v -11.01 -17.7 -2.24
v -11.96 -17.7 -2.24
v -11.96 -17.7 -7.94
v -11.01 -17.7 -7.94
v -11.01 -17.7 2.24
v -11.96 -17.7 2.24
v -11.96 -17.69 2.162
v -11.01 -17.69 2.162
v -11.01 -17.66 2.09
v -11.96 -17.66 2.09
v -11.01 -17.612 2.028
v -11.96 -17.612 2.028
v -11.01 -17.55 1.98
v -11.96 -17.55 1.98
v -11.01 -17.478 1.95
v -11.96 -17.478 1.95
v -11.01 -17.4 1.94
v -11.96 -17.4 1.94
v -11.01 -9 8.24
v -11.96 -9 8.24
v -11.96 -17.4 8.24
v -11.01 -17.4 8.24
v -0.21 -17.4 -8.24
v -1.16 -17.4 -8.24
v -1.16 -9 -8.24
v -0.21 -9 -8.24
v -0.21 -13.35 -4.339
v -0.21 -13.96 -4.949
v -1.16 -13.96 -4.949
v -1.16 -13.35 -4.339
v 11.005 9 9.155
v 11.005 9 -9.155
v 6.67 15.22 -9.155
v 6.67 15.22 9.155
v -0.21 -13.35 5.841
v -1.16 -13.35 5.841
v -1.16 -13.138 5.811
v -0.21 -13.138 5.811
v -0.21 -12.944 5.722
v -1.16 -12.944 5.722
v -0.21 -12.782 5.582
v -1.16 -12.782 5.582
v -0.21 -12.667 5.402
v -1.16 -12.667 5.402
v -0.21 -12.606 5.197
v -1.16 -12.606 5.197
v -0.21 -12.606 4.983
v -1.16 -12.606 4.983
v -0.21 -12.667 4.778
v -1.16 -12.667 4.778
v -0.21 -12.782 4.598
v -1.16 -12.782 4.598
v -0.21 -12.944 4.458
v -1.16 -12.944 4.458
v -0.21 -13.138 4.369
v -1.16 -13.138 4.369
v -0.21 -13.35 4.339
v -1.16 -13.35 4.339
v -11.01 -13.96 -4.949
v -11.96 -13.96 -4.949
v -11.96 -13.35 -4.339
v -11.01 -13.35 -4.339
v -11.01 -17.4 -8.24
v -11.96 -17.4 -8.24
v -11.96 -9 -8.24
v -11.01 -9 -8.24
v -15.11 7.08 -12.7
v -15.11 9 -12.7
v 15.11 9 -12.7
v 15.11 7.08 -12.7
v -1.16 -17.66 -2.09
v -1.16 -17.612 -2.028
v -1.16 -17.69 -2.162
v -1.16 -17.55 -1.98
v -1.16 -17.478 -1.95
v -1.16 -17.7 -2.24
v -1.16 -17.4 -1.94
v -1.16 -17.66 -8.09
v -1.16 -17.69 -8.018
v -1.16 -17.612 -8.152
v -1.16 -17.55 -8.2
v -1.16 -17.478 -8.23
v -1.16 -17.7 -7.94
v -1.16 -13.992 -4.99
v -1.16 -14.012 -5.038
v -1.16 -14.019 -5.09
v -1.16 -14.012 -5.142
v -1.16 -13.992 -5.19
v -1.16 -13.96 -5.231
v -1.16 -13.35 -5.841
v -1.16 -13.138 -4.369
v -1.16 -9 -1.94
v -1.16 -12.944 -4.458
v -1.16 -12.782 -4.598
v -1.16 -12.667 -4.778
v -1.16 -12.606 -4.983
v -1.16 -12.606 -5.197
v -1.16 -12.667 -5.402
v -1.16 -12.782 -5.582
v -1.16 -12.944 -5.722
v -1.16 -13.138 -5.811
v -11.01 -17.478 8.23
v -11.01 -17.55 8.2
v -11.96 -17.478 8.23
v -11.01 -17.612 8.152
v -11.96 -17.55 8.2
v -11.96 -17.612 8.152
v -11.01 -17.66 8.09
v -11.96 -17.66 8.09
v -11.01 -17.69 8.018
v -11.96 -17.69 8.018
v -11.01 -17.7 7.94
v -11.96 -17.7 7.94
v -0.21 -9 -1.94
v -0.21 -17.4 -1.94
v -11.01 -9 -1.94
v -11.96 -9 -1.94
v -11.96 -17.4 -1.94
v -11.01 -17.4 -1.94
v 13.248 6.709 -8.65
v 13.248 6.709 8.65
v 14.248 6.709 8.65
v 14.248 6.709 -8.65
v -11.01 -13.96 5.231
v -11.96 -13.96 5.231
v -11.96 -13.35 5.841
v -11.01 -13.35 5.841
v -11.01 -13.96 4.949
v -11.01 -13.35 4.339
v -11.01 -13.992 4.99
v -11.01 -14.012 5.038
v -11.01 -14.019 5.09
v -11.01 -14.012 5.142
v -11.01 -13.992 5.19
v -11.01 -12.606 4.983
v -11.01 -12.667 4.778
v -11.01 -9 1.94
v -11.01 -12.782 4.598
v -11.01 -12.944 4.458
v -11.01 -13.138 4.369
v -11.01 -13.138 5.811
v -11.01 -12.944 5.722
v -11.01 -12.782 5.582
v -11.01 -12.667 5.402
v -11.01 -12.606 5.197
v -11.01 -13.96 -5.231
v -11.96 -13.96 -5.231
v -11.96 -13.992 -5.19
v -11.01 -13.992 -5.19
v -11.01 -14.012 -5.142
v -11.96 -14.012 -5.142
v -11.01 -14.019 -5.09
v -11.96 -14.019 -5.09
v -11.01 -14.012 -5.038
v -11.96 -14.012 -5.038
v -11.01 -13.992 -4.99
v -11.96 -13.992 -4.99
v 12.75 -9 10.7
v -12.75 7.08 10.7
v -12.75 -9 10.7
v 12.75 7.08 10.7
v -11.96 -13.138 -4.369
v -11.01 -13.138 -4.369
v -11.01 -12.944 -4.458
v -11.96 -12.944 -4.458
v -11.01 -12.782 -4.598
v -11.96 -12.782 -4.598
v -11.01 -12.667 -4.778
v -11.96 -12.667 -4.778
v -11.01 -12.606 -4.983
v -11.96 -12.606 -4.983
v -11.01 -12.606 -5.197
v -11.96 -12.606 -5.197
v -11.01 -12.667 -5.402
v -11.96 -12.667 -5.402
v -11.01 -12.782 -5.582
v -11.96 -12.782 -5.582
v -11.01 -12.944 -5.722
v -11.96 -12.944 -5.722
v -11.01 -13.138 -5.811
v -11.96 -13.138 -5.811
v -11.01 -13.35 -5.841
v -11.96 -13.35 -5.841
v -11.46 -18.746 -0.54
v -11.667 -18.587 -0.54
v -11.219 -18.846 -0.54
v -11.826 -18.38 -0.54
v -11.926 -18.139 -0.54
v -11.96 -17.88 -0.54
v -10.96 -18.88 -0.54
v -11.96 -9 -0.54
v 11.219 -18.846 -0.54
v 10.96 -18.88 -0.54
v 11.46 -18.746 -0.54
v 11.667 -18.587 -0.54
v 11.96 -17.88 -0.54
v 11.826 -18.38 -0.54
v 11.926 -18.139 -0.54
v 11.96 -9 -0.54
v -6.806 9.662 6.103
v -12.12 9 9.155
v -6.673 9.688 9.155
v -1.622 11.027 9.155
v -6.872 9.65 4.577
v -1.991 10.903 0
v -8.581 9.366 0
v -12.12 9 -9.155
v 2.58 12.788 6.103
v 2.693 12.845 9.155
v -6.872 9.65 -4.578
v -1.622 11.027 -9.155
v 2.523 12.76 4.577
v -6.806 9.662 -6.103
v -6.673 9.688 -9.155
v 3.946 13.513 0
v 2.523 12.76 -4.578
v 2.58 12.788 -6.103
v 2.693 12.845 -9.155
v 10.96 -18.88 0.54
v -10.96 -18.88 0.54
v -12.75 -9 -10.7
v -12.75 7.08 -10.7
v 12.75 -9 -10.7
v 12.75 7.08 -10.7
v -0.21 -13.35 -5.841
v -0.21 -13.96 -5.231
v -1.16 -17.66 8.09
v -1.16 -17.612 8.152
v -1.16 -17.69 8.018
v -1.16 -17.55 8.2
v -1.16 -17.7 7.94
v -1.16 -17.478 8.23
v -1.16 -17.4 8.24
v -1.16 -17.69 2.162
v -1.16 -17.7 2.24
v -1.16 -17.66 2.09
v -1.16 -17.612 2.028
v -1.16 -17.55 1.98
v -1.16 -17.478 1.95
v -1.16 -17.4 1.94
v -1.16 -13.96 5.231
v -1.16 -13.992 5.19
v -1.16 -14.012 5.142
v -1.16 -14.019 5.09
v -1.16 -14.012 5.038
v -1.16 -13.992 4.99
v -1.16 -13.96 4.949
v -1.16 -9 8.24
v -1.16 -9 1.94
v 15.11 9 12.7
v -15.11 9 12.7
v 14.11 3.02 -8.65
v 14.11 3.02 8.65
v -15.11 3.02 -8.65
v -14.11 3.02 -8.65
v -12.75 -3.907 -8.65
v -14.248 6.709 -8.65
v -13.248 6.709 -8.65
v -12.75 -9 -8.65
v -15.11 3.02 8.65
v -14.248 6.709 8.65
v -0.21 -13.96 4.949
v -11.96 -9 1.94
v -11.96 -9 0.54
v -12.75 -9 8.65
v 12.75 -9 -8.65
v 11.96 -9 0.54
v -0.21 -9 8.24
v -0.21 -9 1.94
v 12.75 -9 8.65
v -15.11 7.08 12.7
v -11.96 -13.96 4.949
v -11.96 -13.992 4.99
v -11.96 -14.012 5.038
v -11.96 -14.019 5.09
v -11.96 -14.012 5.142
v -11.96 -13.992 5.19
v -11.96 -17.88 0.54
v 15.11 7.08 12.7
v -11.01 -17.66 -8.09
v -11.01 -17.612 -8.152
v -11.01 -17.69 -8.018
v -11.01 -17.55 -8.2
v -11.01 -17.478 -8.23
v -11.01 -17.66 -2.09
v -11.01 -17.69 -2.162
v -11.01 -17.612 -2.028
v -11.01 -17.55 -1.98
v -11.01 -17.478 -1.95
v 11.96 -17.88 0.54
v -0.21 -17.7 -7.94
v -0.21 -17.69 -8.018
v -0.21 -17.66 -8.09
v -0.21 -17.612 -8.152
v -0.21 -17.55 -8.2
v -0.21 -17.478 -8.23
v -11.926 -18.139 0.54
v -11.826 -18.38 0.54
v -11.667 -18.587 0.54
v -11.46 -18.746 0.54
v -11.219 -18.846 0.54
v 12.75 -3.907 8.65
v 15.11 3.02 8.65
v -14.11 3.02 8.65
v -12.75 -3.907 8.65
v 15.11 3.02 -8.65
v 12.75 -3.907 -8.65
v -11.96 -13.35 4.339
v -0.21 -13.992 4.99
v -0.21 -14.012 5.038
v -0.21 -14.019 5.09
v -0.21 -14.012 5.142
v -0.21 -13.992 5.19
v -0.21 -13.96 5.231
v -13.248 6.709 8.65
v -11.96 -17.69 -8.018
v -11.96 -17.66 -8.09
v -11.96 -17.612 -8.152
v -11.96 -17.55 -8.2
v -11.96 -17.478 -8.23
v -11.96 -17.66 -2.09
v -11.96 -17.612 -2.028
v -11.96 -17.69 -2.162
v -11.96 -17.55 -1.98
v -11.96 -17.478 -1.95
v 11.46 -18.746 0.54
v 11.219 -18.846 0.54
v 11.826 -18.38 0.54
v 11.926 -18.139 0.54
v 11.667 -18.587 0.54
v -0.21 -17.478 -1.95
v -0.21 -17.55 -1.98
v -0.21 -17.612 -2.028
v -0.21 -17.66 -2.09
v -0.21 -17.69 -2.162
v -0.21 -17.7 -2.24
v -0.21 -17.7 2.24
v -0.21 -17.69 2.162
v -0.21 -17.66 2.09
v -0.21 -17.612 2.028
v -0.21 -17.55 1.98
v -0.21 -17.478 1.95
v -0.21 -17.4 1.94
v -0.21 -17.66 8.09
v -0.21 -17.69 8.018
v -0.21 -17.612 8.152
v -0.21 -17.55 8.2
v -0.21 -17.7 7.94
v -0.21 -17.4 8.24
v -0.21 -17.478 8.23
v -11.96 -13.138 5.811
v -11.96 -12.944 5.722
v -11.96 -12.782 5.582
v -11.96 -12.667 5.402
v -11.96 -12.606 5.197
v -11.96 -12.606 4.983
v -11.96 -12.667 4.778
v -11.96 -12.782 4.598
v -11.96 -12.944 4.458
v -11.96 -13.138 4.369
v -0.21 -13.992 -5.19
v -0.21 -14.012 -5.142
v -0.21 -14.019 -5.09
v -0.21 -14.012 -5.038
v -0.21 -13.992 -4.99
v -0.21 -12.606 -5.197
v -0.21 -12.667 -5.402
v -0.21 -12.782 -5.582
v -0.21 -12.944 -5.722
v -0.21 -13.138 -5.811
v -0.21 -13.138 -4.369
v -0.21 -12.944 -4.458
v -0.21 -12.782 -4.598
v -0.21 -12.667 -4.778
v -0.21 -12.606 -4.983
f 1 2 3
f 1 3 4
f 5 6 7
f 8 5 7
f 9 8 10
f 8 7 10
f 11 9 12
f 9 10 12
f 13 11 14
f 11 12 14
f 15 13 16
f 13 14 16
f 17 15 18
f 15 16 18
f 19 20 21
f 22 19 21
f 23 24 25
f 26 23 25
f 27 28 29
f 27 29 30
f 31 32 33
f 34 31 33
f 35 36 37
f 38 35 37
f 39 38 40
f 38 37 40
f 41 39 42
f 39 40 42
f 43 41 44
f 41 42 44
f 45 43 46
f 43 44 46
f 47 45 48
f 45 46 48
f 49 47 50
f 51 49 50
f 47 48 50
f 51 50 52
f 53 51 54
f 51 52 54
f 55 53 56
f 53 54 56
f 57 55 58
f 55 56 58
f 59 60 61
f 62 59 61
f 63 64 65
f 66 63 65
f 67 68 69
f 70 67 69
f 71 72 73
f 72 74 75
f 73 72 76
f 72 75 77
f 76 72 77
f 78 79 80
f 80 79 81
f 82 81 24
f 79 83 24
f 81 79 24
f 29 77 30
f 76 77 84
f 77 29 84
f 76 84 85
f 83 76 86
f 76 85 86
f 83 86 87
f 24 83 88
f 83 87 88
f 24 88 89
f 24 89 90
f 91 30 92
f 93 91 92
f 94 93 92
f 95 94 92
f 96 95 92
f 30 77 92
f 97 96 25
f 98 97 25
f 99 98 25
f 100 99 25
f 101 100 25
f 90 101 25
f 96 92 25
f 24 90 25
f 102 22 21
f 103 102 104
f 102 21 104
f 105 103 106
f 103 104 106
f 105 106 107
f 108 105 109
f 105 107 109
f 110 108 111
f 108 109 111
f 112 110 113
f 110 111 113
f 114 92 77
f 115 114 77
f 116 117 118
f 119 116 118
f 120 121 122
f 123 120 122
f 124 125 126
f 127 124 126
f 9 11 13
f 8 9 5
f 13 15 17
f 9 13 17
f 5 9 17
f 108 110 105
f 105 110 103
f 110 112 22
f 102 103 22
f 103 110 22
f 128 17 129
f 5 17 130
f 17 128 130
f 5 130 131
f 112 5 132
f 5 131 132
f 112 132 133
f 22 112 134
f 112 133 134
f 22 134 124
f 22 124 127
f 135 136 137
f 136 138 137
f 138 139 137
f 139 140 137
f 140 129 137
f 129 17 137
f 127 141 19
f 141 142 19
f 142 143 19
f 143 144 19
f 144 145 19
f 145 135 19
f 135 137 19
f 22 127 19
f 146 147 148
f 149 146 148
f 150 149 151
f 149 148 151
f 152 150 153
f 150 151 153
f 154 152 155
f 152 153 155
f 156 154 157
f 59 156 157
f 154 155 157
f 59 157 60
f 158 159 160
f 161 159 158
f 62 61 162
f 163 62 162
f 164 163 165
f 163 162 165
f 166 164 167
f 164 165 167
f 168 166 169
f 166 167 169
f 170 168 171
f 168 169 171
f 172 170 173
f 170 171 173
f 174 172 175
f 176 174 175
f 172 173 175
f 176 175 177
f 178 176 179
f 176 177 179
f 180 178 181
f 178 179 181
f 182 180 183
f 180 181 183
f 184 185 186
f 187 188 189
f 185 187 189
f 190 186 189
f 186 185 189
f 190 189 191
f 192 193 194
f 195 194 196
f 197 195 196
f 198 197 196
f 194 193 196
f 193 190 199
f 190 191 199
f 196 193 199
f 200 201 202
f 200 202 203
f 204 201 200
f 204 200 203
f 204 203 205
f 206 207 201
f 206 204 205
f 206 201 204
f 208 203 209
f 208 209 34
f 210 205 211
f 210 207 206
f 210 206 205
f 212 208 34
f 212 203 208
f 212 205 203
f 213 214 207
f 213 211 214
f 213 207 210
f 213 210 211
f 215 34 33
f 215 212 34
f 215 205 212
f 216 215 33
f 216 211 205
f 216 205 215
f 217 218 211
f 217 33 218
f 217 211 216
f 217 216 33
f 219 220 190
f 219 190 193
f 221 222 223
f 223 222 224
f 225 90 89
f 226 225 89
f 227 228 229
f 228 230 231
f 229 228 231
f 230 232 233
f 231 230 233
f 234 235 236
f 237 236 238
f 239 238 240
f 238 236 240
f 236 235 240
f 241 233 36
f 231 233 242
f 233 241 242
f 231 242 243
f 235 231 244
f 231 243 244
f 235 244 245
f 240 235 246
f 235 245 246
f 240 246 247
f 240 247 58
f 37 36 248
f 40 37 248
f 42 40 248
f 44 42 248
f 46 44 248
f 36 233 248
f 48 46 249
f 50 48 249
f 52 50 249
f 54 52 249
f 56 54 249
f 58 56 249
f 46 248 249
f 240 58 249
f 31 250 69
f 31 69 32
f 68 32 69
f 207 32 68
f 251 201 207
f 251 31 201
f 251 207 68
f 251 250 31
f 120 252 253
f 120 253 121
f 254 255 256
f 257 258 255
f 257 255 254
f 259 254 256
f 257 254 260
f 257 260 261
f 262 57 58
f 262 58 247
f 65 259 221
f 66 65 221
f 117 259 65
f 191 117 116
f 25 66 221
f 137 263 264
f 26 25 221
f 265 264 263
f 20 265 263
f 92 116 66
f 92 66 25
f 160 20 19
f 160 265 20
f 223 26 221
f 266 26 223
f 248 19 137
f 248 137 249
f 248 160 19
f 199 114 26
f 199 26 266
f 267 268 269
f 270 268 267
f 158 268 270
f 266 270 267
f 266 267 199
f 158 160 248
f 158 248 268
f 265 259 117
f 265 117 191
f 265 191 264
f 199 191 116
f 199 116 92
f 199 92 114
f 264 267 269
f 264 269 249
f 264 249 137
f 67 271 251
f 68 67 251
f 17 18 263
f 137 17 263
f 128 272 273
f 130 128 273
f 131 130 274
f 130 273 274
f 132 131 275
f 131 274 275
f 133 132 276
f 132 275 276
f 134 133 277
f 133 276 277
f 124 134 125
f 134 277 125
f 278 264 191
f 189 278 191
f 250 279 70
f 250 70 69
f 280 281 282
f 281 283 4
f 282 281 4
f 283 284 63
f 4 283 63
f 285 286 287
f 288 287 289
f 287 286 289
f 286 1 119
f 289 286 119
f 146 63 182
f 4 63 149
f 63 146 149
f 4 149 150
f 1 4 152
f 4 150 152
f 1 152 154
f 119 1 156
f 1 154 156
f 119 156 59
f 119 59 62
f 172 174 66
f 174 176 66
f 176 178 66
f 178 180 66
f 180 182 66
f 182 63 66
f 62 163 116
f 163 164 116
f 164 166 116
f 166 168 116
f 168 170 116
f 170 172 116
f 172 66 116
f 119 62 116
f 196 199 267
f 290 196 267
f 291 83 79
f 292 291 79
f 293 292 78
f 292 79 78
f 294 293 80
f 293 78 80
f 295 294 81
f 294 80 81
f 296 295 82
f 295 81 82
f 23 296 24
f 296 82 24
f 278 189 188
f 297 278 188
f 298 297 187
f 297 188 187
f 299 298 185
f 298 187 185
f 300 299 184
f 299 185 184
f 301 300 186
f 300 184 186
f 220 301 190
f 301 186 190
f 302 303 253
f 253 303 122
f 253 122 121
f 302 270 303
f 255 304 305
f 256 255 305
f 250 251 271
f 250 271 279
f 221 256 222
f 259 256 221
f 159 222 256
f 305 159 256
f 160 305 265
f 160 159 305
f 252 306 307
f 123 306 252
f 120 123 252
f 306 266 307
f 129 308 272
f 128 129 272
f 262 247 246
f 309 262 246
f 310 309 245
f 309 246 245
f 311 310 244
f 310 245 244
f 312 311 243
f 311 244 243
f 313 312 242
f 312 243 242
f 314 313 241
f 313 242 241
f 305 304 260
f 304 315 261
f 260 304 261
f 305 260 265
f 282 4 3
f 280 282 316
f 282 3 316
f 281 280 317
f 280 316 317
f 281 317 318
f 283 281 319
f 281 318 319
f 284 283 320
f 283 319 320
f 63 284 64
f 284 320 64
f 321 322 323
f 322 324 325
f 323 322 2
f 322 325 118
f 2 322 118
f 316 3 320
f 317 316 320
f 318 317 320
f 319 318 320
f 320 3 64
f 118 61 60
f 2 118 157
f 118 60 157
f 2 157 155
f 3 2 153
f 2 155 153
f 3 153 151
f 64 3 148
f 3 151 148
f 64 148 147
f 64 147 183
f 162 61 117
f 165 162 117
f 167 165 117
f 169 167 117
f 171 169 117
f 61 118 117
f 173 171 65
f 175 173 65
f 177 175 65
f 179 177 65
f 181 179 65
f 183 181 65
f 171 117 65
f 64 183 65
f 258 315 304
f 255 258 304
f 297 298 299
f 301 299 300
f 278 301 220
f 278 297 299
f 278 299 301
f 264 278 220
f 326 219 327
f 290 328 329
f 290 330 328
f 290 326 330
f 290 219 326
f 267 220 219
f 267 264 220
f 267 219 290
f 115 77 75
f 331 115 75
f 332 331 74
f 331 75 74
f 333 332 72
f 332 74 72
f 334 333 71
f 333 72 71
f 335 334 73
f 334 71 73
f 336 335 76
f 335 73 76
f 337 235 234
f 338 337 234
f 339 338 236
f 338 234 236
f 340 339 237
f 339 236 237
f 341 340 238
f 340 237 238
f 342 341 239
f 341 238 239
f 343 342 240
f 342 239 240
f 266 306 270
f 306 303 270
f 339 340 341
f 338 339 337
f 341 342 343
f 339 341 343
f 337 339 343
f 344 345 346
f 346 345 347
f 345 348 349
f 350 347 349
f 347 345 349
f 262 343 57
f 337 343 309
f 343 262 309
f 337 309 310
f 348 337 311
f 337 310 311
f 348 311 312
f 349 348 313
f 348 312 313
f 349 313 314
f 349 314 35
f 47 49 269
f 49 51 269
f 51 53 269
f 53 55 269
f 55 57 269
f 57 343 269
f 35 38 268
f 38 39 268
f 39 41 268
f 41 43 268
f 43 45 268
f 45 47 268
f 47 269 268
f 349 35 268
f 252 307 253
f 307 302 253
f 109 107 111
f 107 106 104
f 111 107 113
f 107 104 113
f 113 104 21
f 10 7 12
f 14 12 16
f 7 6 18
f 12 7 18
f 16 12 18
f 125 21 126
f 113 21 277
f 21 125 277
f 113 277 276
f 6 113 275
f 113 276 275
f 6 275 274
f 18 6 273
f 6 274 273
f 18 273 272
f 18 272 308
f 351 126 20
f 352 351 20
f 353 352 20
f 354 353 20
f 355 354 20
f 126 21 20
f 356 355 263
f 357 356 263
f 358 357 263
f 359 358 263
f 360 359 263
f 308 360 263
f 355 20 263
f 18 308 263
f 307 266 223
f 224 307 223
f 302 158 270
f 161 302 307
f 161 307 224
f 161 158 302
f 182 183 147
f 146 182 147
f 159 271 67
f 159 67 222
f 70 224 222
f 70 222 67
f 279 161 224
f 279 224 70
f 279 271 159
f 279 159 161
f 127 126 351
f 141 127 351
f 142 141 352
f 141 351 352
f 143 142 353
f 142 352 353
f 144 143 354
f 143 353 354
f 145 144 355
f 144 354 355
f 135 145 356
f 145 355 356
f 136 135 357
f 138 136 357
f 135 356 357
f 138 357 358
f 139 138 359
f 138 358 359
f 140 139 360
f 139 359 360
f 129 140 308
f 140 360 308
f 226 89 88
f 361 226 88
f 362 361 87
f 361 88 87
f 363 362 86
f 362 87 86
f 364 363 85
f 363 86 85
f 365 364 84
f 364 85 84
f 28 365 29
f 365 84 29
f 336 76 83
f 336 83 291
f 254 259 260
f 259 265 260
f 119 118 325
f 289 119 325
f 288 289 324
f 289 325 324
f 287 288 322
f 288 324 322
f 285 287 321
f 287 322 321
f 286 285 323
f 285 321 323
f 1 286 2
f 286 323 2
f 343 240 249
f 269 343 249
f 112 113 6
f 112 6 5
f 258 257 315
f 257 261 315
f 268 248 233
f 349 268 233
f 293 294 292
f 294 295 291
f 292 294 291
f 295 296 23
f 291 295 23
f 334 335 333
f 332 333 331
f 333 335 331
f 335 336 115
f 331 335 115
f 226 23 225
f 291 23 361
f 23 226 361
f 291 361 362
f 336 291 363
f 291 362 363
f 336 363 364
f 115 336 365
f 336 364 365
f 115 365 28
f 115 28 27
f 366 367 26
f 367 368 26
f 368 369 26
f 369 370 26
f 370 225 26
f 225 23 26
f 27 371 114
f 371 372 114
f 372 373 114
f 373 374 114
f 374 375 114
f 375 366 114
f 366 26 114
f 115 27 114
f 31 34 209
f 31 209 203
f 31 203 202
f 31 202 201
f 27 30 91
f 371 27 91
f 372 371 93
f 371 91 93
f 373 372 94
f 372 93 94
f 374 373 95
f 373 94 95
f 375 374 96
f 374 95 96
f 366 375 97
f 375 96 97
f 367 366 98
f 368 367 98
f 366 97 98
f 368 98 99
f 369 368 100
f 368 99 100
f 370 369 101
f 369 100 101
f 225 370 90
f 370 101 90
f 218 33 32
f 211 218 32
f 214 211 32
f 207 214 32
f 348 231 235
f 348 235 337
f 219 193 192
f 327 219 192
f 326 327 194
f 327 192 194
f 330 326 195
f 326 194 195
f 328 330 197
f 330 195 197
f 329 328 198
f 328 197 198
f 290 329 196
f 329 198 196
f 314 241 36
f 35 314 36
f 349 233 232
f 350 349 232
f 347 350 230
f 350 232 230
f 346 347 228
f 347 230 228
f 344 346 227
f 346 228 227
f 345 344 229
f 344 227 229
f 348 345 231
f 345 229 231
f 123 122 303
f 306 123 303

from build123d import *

# Parameters (mm, degrees)
BOSS_EXTRUDE1_DEPTH = 10.7
SKETCH2_3_W         = 2.36
SKETCH2_3_H         = 1.92
BOSS_EXTRUDE2_DEPTH = 12.7
EXTRUDE_THIN1_START = -9.155
EXTRUDE_THIN1_DEPTH = 18.31
SKETCH5_W           = 23.92
SKETCH5_H           = 0.54
BOSS_EXTRUDE3_DEPTH = 9.88
CUT_EXTRUDE1_DEPTH  = 2
BOSS_EXTRUDE4_DEPTH = 8.7
CUT_EXTRUDE3_DEPTH  = 18.7
BOSS_EXTRUDE5_DEPTH = 8.65
BOSS_EXTRUDE7_DEPTH = 8.65


# Read off the part's stored shape, not the designer's step: Extrude-Thin1
with BuildPart() as part:
    # Sketch2 → Boss-Extrude1 (new, symmetric)
    with BuildSketch(Plane.XY):
        Polygon((12.75, -3.906779661), (12.75, 7.08), (5.116131156, 7.08), (-12.75, 7.08), (-12.75, -3.906779661), (-12.75, -9), (0, -9), (12.75, -9), align=None)
    extrude(amount=BOSS_EXTRUDE1_DEPTH, both=True)

    # Sketch2<3> → Boss-Extrude2 (add, symmetric)
    with BuildSketch(Plane.XY):
        Polygon((-12.75, 7.08), (5.116131156, 7.08), (5.116131156, 9), (0, 9), (-12.12, 9), (-12.75, 9), align=None)
        with Locations((-13.93, 8.04)):
            Rectangle(SKETCH2_3_W, SKETCH2_3_H)
        with Locations((13.93, 8.04)):
            Rectangle(SKETCH2_3_W, SKETCH2_3_H)
        Polygon((5.116131156, 7.08), (12.75, 7.08), (12.75, 9), (12.12, 9), (6.67, 9), (5.116131156, 9), align=None)
    extrude(amount=BOSS_EXTRUDE2_DEPTH, both=True)

    # Extrude-Thin1 outline → Extrude-Thin1 (add)
    with BuildSketch(Plane.XY.offset(EXTRUDE_THIN1_START)):
        with BuildLine():
            add(Edge.make_bspline(
                [(-12.12, 9), (-1.256881612, 9.695668212), (6.67, 15.22)],
                knots=[0, 0, 0, 1, 1, 1], degree=2))
            Line((-12.12, 9), (11.004787045, 9))
            Line((11.004787045, 9), (6.67, 15.22))
        make_face()
    extrude(amount=EXTRUDE_THIN1_DEPTH)

    # Sketch5 → Boss-Extrude3 (add)
    with BuildSketch(Plane.XZ.offset(9)):
        with Locations((0, -0.27)):
            Rectangle(SKETCH5_W, SKETCH5_H)
        with Locations((0, 0.27)):
            Rectangle(SKETCH5_W, SKETCH5_H)
    extrude(amount=BOSS_EXTRUDE3_DEPTH)

    # Sketch6 → Cut-Extrude1 (cut)
    with BuildSketch(Plane(origin=(0, 0, -0.54), x_dir=(-1, 0, 0), z_dir=(0, 0, -1))):
        with BuildLine():
            ThreePointArc((-10.96, -18.88), (-11.667106781, -18.587106781), (-11.96, -17.88))
            Line((-11.96, -17.88), (-11.96, -18.88))
            Line((-11.96, -18.88), (-10.96, -18.88))
        make_face()
        with BuildLine():
            Line((11.96, -18.88), (11.96, -17.88))
            ThreePointArc((11.96, -17.88), (11.667106781, -18.587106781), (10.96, -18.88))
            Line((10.96, -18.88), (11.96, -18.88))
        make_face()
    extrude(amount=-CUT_EXTRUDE1_DEPTH, mode=Mode.SUBTRACT)

    # Sketch7 → Boss-Extrude4 (add)
    with BuildSketch(Plane.XZ.offset(9)):
        Polygon((-11.96, 9.64), (-11.96, 0.54), (-11.01, 0.54), (-11.01, 3.822076599), (-11.01, 9.64), align=None)
        Polygon((-1.16, 3.822076599), (-1.16, 0.54), (-0.21, 0.54), (-0.21, 9.64), (-1.16, 9.64), align=None)
        Polygon((-0.21, -0.54), (-1.16, -0.54), (-1.16, -5.923650712), (-1.16, -9.64), (-0.21, -9.64), align=None)
        Polygon((-11.01, -0.54), (-11.96, -0.54), (-11.96, -9.64), (-11.01, -9.64), (-11.01, -5.923650712), align=None)
    extrude(amount=BOSS_EXTRUDE4_DEPTH)

    # Sketch8 → Cut-Extrude3 (cut)
    with BuildSketch(Plane.ZY.offset(11.96)):
        with BuildLine():
            Line((-8.24, -9), (-9.64, -9))
            Line((-9.64, -9), (-9.64, -17.7))
            Line((-9.64, -17.7), (-7.94, -17.7))
            ThreePointArc((-7.94, -17.7), (-8.152132034, -17.612132034), (-8.24, -17.4))
            Line((-8.24, -17.4), (-8.24, -9))
        make_face()
        with BuildLine():
            Line((-0.54, -9), (-1.94, -9))
            Line((-1.94, -9), (-1.94, -17.4))
            ThreePointArc((-1.94, -17.4), (-2.027867966, -17.612132034), (-2.24, -17.7))
            Line((-2.24, -17.7), (-0.54, -17.7))
            Line((-0.54, -17.7), (-0.54, -9))
        make_face()
        with BuildLine():
            ThreePointArc((-4.33865298, -13.35), (-5.09, -12.59865298), (-5.84134702, -13.35))
            Line((-5.84134702, -13.35), (-5.231421356, -13.959925664))
            ThreePointArc((-5.231421356, -13.959925664), (-5.09, -14.018504308), (-4.948578644, -13.959925664))
            Line((-4.948578644, -13.959925664), (-4.33865298, -13.35))
        make_face()
        with BuildLine():
            Line((1.94, -9), (0.54, -9))
            Line((0.54, -9), (0.54, -17.7))
            Line((0.54, -17.7), (2.24, -17.7))
            ThreePointArc((2.24, -17.7), (2.027867966, -17.612132034), (1.94, -17.4))
            Line((1.94, -17.4), (1.94, -9))
        make_face()
        with BuildLine():
            Line((9.64, -9), (8.24, -9))
            Line((8.24, -9), (8.24, -17.4))
            ThreePointArc((8.24, -17.4), (8.152132034, -17.612132034), (7.94, -17.7))
            Line((7.94, -17.7), (9.64, -17.7))
            Line((9.64, -17.7), (9.64, -9))
        make_face()
        with BuildLine():
            ThreePointArc((5.84134702, -13.35), (5.09, -12.59865298), (4.33865298, -13.35))
            Line((4.33865298, -13.35), (4.948578644, -13.959925664))
            ThreePointArc((4.948578644, -13.959925664), (5.09, -14.018504308), (5.231421356, -13.959925664))
            Line((5.231421356, -13.959925664), (5.84134702, -13.35))
        make_face()
    extrude(amount=-CUT_EXTRUDE3_DEPTH, mode=Mode.SUBTRACT)

    # Sketch2<13> → Boss-Extrude5 (add, symmetric)
    with BuildSketch(Plane.XY):
        Polygon((14.248489171, 6.709143574), (15.11, 3.02), (12.75, -9), (12.75, -3.906779661), (14.11, 3.02), (13.248489171, 6.709143574), align=None)
    extrude(amount=BOSS_EXTRUDE5_DEPTH, both=True)

    # Sketch2<16> → Boss-Extrude7 (add, symmetric)
    with BuildSketch(Plane.XY):
        Polygon((-12.75, -3.906779661), (-12.75, -9), (-15.11, 3.02), (-14.248489171, 6.709143574), (-13.248489171, 6.709143574), (-14.11, 3.02), align=None)
    extrude(amount=BOSS_EXTRUDE7_DEPTH, both=True)


solid = part.part
